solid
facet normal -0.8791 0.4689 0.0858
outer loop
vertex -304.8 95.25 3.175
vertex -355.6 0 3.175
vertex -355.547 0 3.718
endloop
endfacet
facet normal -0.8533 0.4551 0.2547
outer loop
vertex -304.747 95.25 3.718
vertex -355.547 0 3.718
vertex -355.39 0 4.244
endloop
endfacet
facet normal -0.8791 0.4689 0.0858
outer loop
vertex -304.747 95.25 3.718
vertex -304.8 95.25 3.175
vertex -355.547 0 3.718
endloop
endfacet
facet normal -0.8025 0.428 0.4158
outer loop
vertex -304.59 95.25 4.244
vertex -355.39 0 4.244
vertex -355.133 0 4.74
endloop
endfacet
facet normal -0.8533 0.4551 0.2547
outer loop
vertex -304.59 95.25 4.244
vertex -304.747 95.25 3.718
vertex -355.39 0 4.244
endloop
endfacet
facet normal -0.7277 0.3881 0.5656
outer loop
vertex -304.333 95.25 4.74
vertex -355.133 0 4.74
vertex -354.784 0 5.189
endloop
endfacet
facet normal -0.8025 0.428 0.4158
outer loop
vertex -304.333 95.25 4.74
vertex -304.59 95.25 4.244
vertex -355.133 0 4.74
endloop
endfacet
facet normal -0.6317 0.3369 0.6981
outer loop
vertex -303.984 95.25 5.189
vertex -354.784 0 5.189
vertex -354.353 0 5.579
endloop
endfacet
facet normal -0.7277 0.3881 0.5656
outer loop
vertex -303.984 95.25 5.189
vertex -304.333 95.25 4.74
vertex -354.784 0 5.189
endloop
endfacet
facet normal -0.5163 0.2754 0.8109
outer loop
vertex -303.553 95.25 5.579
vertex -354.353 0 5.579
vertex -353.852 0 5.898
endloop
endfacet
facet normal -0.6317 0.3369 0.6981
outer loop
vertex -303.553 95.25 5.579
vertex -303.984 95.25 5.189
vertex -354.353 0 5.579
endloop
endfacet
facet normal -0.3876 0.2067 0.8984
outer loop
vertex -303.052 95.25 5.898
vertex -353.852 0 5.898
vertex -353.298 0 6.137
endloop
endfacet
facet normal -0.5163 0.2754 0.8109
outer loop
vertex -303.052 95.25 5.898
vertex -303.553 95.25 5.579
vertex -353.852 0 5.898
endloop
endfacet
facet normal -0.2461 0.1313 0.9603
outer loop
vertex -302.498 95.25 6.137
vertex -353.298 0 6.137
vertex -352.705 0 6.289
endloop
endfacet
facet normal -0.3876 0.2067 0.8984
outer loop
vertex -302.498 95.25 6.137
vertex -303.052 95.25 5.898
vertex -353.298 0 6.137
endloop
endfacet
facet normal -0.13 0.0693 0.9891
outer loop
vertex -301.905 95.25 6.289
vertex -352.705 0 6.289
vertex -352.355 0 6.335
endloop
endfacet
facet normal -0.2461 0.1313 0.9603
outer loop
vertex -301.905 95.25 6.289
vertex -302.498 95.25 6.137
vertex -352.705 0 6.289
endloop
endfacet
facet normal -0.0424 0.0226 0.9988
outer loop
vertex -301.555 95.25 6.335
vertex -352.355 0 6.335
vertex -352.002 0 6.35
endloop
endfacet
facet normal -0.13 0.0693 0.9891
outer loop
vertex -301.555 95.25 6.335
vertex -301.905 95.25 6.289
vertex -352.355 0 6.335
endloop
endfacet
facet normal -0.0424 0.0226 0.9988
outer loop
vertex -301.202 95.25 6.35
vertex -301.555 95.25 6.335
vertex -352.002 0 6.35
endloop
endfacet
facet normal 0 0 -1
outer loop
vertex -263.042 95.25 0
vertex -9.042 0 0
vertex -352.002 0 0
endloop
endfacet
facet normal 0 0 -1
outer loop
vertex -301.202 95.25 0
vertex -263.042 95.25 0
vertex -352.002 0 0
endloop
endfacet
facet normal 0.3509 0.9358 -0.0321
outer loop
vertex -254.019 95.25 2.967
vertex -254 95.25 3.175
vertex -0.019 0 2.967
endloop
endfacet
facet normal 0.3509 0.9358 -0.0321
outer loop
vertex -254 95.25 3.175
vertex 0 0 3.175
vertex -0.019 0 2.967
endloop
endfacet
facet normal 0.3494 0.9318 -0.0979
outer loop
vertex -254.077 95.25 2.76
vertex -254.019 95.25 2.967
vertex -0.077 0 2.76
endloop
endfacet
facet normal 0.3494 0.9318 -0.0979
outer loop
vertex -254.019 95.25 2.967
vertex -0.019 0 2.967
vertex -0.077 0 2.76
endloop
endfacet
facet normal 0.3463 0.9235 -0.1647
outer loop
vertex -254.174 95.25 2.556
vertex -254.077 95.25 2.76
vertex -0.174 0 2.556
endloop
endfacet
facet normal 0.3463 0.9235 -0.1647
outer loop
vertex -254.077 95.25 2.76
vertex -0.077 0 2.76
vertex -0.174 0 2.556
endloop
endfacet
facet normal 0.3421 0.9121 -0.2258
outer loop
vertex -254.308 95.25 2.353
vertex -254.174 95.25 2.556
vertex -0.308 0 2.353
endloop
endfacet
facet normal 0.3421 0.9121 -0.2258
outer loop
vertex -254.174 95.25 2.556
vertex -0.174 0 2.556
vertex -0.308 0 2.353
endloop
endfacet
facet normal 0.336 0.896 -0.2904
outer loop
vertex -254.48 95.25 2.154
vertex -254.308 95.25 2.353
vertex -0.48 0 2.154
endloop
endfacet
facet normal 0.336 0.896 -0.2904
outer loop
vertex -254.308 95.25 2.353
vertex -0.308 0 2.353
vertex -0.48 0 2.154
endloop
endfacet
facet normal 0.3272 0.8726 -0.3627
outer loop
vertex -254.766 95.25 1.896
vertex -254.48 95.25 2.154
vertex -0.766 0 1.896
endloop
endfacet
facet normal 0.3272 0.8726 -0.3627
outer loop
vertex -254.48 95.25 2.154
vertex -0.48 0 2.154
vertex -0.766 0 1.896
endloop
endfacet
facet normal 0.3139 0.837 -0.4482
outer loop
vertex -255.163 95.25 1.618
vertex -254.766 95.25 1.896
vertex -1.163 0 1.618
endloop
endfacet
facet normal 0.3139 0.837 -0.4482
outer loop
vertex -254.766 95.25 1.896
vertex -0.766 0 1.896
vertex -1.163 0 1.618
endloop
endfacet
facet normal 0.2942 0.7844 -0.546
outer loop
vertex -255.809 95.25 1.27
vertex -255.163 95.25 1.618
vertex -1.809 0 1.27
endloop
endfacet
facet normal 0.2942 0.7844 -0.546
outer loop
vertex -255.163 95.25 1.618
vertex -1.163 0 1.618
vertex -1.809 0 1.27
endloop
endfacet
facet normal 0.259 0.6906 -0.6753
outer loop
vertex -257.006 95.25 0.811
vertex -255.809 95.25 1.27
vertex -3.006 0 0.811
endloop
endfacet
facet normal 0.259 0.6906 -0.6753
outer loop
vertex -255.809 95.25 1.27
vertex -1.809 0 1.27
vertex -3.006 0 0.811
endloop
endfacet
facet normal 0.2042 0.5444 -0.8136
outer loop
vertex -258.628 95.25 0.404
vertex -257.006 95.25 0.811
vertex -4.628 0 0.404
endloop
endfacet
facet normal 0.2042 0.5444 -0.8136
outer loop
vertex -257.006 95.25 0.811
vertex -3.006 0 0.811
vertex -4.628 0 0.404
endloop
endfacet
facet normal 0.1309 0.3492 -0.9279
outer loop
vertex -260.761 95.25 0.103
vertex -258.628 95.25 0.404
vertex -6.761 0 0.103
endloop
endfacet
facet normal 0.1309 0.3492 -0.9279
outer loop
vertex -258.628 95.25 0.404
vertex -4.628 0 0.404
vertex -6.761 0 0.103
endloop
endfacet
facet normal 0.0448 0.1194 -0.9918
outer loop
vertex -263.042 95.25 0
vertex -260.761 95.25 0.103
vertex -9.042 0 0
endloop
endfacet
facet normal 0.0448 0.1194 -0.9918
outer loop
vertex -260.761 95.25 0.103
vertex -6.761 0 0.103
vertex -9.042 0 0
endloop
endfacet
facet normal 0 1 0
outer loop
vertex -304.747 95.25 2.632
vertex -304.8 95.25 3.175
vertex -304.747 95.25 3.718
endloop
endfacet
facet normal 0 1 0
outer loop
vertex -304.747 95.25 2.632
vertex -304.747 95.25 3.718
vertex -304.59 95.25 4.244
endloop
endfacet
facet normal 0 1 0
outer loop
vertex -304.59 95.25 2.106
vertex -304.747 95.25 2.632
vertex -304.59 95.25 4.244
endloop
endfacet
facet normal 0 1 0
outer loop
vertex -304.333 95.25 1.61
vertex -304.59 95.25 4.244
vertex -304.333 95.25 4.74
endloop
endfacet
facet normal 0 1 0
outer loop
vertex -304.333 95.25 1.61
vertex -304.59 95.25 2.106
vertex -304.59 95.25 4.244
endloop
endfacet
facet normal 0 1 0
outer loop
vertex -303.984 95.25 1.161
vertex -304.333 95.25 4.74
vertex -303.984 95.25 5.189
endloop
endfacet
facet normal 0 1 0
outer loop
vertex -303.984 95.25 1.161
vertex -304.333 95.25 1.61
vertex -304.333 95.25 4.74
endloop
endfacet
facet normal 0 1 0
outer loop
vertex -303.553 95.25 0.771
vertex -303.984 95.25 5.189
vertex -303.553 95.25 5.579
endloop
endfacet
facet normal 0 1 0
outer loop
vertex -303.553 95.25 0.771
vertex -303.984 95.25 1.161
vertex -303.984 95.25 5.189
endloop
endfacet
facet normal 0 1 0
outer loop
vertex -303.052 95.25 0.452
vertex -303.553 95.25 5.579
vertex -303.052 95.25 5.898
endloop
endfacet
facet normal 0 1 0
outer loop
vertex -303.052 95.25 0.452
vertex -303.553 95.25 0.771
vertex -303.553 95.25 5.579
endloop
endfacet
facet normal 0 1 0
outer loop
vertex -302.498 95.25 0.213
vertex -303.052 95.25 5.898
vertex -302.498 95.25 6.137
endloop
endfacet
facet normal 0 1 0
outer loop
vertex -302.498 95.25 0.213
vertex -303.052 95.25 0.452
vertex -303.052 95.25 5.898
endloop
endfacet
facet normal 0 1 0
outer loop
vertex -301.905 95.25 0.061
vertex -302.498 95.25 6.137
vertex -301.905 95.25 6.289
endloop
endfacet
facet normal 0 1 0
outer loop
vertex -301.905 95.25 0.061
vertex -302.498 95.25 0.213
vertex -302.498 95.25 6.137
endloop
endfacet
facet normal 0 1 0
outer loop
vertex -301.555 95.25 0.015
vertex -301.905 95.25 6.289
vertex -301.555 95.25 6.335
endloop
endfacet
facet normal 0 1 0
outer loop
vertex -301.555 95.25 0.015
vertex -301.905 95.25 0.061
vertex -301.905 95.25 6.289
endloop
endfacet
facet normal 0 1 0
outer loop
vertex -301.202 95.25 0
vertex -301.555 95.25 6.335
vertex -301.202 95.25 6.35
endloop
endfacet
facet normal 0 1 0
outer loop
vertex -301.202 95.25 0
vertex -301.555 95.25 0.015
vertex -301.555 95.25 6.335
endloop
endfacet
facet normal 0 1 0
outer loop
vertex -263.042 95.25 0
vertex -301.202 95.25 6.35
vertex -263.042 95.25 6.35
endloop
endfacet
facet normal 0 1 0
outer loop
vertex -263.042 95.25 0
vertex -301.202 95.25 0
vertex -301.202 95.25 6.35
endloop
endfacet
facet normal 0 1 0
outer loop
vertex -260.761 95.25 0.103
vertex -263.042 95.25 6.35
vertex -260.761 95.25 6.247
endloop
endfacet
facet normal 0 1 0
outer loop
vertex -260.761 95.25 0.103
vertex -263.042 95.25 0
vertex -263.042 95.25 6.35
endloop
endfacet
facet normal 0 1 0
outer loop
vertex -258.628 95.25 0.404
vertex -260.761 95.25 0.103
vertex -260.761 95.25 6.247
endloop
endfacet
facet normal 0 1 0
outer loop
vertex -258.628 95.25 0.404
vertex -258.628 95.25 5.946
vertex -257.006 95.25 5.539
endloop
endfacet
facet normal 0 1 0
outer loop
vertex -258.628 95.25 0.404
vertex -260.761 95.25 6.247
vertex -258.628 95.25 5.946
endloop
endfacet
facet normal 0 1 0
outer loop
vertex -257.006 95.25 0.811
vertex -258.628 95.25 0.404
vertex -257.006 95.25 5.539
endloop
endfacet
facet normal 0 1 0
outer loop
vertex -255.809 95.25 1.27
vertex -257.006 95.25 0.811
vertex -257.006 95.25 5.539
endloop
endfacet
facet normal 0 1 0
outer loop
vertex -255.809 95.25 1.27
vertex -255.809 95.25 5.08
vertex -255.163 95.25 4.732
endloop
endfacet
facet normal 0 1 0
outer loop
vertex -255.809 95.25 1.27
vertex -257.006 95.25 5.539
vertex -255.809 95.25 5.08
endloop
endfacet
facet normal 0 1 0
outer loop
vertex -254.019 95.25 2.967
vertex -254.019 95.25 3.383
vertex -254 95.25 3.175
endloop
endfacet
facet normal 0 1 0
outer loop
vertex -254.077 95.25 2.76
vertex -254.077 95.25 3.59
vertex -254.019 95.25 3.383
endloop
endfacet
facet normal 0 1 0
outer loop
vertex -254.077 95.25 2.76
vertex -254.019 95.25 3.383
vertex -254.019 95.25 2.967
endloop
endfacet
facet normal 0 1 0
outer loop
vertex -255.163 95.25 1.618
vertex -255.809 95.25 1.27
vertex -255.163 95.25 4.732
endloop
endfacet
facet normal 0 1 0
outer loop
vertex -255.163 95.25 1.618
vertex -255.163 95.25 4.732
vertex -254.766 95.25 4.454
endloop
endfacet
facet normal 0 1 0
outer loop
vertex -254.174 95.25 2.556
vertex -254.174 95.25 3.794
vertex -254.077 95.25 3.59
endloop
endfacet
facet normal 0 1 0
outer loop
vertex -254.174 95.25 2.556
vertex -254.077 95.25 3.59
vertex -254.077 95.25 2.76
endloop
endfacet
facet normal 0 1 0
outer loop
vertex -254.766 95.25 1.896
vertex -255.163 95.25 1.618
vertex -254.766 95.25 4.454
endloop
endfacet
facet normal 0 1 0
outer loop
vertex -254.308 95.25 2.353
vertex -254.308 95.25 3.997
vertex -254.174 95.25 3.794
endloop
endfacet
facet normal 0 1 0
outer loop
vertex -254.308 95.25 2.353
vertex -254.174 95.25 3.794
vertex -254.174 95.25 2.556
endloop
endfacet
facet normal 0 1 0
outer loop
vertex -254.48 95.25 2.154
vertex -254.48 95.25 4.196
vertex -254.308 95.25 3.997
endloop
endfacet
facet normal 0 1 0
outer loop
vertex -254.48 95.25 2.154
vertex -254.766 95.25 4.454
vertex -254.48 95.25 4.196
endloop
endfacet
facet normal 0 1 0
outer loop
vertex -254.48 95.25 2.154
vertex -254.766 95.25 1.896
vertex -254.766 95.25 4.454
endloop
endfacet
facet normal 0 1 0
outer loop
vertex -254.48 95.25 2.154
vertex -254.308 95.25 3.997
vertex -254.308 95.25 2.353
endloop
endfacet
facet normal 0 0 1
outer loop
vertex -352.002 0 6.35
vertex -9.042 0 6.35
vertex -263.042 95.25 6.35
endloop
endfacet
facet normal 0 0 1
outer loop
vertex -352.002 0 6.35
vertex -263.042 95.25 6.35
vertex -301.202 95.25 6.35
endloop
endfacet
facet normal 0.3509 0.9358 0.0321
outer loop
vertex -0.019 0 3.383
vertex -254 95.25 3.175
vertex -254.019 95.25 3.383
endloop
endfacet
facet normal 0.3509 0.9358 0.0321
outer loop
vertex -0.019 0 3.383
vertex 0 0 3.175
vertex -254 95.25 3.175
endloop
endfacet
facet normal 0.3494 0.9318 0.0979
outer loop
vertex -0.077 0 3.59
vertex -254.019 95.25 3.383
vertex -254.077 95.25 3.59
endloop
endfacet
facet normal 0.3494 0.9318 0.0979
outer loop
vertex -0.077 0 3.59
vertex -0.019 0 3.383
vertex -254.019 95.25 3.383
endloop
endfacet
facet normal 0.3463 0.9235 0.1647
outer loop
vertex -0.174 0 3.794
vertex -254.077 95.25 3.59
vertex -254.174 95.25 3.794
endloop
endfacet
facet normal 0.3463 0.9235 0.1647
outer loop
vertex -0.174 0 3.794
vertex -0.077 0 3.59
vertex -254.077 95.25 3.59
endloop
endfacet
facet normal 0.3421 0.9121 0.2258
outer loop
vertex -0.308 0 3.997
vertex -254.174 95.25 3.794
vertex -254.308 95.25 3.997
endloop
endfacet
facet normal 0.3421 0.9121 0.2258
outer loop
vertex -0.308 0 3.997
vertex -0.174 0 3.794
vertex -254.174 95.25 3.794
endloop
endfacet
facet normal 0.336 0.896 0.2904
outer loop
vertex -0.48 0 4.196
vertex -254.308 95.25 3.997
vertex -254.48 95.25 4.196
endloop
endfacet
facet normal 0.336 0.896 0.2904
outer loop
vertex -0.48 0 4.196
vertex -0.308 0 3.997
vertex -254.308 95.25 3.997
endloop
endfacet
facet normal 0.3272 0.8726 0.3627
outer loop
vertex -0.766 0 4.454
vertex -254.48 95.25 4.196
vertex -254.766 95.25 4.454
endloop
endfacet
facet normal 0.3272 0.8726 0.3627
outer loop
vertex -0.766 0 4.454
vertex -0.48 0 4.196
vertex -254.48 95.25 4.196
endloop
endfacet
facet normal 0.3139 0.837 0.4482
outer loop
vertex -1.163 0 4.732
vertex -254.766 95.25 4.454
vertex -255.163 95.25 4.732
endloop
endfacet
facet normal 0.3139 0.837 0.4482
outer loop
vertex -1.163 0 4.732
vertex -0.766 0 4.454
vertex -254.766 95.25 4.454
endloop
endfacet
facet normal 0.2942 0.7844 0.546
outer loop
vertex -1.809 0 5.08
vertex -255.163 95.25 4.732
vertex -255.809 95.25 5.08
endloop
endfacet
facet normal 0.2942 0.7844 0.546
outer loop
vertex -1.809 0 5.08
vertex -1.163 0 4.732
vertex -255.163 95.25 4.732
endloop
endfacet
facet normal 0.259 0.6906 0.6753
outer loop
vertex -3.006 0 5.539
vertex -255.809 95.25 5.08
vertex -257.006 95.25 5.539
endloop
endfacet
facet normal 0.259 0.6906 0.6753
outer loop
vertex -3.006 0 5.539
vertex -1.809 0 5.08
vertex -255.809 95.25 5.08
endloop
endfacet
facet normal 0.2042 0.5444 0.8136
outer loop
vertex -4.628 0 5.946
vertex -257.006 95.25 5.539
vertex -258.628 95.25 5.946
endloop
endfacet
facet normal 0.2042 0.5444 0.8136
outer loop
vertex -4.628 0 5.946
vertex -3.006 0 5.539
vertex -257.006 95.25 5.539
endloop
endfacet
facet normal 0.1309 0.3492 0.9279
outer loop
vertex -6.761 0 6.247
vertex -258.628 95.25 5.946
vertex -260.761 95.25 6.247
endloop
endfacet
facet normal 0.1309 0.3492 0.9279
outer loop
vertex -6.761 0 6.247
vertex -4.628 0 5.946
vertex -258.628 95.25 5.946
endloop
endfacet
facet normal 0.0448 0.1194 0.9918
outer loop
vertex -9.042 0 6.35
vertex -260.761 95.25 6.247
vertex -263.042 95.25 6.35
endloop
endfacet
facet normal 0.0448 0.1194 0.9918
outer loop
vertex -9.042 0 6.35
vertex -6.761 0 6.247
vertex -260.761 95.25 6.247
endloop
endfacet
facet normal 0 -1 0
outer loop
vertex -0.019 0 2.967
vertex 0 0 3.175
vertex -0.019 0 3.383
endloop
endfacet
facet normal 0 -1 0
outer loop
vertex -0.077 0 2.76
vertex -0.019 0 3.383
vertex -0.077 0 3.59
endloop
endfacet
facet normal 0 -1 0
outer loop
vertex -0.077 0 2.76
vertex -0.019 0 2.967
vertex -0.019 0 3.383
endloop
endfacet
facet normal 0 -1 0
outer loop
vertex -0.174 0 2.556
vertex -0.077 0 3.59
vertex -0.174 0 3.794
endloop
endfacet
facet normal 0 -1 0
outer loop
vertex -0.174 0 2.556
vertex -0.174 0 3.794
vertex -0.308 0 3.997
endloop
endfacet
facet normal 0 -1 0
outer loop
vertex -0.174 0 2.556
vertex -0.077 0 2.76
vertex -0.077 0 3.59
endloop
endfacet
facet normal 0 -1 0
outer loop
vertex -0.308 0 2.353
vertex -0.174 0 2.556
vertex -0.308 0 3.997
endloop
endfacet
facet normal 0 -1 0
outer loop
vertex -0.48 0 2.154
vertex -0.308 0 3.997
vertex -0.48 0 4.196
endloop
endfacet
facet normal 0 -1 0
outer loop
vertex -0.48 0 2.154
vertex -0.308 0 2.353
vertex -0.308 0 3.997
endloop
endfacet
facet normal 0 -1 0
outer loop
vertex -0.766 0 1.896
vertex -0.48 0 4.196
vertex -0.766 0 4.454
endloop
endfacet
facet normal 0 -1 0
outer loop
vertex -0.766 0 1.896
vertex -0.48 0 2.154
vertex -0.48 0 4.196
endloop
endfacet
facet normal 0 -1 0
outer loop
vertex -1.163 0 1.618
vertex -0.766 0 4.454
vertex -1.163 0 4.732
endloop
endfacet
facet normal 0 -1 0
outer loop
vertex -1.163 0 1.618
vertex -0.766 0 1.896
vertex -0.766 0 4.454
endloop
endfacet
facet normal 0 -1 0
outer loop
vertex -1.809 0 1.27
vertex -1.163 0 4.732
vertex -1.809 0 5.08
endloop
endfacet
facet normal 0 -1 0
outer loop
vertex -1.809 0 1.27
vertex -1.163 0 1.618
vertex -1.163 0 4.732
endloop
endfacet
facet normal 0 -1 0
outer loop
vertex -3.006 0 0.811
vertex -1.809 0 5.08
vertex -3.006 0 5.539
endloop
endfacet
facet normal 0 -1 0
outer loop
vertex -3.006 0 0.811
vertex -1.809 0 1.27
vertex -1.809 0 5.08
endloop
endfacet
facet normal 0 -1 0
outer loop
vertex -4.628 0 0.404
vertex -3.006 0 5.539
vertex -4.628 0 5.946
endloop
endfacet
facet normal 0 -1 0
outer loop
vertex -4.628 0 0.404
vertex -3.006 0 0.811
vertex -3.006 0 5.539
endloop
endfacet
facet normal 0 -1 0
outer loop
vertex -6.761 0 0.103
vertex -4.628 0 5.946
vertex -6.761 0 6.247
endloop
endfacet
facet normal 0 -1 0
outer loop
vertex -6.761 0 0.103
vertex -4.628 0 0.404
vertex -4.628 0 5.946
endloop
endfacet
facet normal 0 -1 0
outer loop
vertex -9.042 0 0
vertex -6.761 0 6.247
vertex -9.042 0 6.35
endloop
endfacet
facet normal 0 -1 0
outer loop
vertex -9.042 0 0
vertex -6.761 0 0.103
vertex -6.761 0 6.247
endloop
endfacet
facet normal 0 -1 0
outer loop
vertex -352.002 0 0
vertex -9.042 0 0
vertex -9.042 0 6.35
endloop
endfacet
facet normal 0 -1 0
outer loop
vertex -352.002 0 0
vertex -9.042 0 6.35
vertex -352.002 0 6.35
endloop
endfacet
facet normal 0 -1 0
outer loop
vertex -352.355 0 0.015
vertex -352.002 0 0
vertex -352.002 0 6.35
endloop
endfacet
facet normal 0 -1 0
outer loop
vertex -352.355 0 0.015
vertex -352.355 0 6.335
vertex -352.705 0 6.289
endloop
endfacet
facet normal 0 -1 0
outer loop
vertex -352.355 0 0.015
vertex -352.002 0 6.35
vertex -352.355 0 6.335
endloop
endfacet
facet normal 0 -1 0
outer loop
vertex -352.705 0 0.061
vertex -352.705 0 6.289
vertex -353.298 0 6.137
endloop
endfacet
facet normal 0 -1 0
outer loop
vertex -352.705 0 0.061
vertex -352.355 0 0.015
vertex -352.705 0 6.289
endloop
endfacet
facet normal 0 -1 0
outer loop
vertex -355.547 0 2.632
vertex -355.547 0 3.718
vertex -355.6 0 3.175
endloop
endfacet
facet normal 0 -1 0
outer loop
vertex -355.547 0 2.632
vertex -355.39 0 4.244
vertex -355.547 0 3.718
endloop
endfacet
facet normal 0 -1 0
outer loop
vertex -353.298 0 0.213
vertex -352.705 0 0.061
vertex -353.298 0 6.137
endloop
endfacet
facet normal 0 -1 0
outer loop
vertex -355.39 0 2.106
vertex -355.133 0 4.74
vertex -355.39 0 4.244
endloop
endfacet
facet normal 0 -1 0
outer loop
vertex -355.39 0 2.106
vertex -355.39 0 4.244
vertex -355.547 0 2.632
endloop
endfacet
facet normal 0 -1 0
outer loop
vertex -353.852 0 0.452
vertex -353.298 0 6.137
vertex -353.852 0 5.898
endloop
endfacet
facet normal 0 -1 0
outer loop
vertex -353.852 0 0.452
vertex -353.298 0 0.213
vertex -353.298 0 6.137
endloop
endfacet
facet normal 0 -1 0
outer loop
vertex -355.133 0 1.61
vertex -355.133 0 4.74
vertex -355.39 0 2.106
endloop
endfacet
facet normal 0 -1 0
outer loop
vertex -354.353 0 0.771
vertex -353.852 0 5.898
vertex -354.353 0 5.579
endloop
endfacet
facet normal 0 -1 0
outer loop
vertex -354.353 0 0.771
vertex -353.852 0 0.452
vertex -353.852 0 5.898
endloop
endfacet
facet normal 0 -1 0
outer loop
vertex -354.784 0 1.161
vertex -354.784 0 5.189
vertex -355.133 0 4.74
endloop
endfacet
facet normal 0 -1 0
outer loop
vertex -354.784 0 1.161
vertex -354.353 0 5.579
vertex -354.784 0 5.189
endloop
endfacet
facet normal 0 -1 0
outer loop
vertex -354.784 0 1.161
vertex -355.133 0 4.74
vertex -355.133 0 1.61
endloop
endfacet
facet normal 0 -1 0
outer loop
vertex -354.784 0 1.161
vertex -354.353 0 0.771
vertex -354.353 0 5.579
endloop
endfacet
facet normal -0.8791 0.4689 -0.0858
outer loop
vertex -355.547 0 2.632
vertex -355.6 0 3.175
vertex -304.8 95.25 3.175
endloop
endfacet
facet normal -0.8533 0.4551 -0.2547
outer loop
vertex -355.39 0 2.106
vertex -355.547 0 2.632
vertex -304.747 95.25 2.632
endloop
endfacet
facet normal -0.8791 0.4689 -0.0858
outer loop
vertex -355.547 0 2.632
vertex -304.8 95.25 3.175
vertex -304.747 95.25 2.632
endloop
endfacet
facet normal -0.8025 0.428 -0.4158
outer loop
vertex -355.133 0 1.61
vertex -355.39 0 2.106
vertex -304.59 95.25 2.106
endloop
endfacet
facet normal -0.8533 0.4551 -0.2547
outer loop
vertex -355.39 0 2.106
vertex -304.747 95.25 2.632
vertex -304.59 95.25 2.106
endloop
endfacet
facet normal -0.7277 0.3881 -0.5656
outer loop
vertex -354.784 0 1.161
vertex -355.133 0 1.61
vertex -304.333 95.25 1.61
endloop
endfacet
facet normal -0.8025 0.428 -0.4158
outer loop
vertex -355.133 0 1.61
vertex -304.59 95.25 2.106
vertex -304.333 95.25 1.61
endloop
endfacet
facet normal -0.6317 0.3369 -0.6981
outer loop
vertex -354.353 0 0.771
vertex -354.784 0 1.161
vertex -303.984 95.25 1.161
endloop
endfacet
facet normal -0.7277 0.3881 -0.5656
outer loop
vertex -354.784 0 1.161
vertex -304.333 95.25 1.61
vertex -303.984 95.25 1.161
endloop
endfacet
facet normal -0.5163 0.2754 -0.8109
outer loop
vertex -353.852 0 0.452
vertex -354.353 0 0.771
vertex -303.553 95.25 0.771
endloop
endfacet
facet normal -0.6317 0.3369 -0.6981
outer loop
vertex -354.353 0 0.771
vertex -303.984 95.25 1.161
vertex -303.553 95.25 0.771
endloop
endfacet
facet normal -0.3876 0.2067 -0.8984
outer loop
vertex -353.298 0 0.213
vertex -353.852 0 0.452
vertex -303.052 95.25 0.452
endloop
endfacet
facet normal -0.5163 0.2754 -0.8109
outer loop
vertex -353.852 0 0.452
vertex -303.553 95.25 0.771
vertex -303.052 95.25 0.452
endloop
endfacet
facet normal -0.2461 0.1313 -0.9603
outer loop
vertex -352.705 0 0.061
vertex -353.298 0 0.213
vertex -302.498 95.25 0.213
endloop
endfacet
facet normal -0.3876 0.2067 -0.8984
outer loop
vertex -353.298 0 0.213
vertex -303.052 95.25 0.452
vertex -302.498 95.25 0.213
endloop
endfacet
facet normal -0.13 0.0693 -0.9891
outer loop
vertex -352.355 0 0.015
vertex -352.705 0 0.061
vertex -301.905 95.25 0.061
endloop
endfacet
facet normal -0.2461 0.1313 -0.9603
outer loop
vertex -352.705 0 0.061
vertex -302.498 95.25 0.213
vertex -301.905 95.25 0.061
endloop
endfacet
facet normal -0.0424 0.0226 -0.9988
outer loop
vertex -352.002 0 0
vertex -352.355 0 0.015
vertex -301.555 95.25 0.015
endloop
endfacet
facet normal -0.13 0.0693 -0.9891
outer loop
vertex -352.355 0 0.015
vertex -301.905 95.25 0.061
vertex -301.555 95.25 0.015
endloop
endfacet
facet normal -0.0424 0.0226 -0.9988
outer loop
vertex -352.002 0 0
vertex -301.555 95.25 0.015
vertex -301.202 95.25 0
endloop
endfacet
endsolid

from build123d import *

# Parameters (mm, degrees)
BOSS_EXTRUDE1_DEPTH = 6.35
FILLET1_R           = 3.175


with BuildPart() as part:
    # Sketch1 → Boss-Extrude1 (new body)
    with BuildSketch(Plane.XY):
        Polygon((0, 0), (-355.6, 0), (-304.8, 95.25), (-254, 95.25), align=None)
    extrude(amount=BOSS_EXTRUDE1_DEPTH)

    # Fillet1
    fillet1_edges = [part.edges().sort_by_distance(p)[0] for p in [
        (-330.2, 47.625, 6.35),
        (-330.2, 47.625, 0),
        (-127, 47.625, 6.35),
        (-127, 47.625, 0),
    ]]
    fillet(fillet1_edges, radius=FILLET1_R - 0.0001)  # a hair under: the kernel refuses the full size


solid = part.part
